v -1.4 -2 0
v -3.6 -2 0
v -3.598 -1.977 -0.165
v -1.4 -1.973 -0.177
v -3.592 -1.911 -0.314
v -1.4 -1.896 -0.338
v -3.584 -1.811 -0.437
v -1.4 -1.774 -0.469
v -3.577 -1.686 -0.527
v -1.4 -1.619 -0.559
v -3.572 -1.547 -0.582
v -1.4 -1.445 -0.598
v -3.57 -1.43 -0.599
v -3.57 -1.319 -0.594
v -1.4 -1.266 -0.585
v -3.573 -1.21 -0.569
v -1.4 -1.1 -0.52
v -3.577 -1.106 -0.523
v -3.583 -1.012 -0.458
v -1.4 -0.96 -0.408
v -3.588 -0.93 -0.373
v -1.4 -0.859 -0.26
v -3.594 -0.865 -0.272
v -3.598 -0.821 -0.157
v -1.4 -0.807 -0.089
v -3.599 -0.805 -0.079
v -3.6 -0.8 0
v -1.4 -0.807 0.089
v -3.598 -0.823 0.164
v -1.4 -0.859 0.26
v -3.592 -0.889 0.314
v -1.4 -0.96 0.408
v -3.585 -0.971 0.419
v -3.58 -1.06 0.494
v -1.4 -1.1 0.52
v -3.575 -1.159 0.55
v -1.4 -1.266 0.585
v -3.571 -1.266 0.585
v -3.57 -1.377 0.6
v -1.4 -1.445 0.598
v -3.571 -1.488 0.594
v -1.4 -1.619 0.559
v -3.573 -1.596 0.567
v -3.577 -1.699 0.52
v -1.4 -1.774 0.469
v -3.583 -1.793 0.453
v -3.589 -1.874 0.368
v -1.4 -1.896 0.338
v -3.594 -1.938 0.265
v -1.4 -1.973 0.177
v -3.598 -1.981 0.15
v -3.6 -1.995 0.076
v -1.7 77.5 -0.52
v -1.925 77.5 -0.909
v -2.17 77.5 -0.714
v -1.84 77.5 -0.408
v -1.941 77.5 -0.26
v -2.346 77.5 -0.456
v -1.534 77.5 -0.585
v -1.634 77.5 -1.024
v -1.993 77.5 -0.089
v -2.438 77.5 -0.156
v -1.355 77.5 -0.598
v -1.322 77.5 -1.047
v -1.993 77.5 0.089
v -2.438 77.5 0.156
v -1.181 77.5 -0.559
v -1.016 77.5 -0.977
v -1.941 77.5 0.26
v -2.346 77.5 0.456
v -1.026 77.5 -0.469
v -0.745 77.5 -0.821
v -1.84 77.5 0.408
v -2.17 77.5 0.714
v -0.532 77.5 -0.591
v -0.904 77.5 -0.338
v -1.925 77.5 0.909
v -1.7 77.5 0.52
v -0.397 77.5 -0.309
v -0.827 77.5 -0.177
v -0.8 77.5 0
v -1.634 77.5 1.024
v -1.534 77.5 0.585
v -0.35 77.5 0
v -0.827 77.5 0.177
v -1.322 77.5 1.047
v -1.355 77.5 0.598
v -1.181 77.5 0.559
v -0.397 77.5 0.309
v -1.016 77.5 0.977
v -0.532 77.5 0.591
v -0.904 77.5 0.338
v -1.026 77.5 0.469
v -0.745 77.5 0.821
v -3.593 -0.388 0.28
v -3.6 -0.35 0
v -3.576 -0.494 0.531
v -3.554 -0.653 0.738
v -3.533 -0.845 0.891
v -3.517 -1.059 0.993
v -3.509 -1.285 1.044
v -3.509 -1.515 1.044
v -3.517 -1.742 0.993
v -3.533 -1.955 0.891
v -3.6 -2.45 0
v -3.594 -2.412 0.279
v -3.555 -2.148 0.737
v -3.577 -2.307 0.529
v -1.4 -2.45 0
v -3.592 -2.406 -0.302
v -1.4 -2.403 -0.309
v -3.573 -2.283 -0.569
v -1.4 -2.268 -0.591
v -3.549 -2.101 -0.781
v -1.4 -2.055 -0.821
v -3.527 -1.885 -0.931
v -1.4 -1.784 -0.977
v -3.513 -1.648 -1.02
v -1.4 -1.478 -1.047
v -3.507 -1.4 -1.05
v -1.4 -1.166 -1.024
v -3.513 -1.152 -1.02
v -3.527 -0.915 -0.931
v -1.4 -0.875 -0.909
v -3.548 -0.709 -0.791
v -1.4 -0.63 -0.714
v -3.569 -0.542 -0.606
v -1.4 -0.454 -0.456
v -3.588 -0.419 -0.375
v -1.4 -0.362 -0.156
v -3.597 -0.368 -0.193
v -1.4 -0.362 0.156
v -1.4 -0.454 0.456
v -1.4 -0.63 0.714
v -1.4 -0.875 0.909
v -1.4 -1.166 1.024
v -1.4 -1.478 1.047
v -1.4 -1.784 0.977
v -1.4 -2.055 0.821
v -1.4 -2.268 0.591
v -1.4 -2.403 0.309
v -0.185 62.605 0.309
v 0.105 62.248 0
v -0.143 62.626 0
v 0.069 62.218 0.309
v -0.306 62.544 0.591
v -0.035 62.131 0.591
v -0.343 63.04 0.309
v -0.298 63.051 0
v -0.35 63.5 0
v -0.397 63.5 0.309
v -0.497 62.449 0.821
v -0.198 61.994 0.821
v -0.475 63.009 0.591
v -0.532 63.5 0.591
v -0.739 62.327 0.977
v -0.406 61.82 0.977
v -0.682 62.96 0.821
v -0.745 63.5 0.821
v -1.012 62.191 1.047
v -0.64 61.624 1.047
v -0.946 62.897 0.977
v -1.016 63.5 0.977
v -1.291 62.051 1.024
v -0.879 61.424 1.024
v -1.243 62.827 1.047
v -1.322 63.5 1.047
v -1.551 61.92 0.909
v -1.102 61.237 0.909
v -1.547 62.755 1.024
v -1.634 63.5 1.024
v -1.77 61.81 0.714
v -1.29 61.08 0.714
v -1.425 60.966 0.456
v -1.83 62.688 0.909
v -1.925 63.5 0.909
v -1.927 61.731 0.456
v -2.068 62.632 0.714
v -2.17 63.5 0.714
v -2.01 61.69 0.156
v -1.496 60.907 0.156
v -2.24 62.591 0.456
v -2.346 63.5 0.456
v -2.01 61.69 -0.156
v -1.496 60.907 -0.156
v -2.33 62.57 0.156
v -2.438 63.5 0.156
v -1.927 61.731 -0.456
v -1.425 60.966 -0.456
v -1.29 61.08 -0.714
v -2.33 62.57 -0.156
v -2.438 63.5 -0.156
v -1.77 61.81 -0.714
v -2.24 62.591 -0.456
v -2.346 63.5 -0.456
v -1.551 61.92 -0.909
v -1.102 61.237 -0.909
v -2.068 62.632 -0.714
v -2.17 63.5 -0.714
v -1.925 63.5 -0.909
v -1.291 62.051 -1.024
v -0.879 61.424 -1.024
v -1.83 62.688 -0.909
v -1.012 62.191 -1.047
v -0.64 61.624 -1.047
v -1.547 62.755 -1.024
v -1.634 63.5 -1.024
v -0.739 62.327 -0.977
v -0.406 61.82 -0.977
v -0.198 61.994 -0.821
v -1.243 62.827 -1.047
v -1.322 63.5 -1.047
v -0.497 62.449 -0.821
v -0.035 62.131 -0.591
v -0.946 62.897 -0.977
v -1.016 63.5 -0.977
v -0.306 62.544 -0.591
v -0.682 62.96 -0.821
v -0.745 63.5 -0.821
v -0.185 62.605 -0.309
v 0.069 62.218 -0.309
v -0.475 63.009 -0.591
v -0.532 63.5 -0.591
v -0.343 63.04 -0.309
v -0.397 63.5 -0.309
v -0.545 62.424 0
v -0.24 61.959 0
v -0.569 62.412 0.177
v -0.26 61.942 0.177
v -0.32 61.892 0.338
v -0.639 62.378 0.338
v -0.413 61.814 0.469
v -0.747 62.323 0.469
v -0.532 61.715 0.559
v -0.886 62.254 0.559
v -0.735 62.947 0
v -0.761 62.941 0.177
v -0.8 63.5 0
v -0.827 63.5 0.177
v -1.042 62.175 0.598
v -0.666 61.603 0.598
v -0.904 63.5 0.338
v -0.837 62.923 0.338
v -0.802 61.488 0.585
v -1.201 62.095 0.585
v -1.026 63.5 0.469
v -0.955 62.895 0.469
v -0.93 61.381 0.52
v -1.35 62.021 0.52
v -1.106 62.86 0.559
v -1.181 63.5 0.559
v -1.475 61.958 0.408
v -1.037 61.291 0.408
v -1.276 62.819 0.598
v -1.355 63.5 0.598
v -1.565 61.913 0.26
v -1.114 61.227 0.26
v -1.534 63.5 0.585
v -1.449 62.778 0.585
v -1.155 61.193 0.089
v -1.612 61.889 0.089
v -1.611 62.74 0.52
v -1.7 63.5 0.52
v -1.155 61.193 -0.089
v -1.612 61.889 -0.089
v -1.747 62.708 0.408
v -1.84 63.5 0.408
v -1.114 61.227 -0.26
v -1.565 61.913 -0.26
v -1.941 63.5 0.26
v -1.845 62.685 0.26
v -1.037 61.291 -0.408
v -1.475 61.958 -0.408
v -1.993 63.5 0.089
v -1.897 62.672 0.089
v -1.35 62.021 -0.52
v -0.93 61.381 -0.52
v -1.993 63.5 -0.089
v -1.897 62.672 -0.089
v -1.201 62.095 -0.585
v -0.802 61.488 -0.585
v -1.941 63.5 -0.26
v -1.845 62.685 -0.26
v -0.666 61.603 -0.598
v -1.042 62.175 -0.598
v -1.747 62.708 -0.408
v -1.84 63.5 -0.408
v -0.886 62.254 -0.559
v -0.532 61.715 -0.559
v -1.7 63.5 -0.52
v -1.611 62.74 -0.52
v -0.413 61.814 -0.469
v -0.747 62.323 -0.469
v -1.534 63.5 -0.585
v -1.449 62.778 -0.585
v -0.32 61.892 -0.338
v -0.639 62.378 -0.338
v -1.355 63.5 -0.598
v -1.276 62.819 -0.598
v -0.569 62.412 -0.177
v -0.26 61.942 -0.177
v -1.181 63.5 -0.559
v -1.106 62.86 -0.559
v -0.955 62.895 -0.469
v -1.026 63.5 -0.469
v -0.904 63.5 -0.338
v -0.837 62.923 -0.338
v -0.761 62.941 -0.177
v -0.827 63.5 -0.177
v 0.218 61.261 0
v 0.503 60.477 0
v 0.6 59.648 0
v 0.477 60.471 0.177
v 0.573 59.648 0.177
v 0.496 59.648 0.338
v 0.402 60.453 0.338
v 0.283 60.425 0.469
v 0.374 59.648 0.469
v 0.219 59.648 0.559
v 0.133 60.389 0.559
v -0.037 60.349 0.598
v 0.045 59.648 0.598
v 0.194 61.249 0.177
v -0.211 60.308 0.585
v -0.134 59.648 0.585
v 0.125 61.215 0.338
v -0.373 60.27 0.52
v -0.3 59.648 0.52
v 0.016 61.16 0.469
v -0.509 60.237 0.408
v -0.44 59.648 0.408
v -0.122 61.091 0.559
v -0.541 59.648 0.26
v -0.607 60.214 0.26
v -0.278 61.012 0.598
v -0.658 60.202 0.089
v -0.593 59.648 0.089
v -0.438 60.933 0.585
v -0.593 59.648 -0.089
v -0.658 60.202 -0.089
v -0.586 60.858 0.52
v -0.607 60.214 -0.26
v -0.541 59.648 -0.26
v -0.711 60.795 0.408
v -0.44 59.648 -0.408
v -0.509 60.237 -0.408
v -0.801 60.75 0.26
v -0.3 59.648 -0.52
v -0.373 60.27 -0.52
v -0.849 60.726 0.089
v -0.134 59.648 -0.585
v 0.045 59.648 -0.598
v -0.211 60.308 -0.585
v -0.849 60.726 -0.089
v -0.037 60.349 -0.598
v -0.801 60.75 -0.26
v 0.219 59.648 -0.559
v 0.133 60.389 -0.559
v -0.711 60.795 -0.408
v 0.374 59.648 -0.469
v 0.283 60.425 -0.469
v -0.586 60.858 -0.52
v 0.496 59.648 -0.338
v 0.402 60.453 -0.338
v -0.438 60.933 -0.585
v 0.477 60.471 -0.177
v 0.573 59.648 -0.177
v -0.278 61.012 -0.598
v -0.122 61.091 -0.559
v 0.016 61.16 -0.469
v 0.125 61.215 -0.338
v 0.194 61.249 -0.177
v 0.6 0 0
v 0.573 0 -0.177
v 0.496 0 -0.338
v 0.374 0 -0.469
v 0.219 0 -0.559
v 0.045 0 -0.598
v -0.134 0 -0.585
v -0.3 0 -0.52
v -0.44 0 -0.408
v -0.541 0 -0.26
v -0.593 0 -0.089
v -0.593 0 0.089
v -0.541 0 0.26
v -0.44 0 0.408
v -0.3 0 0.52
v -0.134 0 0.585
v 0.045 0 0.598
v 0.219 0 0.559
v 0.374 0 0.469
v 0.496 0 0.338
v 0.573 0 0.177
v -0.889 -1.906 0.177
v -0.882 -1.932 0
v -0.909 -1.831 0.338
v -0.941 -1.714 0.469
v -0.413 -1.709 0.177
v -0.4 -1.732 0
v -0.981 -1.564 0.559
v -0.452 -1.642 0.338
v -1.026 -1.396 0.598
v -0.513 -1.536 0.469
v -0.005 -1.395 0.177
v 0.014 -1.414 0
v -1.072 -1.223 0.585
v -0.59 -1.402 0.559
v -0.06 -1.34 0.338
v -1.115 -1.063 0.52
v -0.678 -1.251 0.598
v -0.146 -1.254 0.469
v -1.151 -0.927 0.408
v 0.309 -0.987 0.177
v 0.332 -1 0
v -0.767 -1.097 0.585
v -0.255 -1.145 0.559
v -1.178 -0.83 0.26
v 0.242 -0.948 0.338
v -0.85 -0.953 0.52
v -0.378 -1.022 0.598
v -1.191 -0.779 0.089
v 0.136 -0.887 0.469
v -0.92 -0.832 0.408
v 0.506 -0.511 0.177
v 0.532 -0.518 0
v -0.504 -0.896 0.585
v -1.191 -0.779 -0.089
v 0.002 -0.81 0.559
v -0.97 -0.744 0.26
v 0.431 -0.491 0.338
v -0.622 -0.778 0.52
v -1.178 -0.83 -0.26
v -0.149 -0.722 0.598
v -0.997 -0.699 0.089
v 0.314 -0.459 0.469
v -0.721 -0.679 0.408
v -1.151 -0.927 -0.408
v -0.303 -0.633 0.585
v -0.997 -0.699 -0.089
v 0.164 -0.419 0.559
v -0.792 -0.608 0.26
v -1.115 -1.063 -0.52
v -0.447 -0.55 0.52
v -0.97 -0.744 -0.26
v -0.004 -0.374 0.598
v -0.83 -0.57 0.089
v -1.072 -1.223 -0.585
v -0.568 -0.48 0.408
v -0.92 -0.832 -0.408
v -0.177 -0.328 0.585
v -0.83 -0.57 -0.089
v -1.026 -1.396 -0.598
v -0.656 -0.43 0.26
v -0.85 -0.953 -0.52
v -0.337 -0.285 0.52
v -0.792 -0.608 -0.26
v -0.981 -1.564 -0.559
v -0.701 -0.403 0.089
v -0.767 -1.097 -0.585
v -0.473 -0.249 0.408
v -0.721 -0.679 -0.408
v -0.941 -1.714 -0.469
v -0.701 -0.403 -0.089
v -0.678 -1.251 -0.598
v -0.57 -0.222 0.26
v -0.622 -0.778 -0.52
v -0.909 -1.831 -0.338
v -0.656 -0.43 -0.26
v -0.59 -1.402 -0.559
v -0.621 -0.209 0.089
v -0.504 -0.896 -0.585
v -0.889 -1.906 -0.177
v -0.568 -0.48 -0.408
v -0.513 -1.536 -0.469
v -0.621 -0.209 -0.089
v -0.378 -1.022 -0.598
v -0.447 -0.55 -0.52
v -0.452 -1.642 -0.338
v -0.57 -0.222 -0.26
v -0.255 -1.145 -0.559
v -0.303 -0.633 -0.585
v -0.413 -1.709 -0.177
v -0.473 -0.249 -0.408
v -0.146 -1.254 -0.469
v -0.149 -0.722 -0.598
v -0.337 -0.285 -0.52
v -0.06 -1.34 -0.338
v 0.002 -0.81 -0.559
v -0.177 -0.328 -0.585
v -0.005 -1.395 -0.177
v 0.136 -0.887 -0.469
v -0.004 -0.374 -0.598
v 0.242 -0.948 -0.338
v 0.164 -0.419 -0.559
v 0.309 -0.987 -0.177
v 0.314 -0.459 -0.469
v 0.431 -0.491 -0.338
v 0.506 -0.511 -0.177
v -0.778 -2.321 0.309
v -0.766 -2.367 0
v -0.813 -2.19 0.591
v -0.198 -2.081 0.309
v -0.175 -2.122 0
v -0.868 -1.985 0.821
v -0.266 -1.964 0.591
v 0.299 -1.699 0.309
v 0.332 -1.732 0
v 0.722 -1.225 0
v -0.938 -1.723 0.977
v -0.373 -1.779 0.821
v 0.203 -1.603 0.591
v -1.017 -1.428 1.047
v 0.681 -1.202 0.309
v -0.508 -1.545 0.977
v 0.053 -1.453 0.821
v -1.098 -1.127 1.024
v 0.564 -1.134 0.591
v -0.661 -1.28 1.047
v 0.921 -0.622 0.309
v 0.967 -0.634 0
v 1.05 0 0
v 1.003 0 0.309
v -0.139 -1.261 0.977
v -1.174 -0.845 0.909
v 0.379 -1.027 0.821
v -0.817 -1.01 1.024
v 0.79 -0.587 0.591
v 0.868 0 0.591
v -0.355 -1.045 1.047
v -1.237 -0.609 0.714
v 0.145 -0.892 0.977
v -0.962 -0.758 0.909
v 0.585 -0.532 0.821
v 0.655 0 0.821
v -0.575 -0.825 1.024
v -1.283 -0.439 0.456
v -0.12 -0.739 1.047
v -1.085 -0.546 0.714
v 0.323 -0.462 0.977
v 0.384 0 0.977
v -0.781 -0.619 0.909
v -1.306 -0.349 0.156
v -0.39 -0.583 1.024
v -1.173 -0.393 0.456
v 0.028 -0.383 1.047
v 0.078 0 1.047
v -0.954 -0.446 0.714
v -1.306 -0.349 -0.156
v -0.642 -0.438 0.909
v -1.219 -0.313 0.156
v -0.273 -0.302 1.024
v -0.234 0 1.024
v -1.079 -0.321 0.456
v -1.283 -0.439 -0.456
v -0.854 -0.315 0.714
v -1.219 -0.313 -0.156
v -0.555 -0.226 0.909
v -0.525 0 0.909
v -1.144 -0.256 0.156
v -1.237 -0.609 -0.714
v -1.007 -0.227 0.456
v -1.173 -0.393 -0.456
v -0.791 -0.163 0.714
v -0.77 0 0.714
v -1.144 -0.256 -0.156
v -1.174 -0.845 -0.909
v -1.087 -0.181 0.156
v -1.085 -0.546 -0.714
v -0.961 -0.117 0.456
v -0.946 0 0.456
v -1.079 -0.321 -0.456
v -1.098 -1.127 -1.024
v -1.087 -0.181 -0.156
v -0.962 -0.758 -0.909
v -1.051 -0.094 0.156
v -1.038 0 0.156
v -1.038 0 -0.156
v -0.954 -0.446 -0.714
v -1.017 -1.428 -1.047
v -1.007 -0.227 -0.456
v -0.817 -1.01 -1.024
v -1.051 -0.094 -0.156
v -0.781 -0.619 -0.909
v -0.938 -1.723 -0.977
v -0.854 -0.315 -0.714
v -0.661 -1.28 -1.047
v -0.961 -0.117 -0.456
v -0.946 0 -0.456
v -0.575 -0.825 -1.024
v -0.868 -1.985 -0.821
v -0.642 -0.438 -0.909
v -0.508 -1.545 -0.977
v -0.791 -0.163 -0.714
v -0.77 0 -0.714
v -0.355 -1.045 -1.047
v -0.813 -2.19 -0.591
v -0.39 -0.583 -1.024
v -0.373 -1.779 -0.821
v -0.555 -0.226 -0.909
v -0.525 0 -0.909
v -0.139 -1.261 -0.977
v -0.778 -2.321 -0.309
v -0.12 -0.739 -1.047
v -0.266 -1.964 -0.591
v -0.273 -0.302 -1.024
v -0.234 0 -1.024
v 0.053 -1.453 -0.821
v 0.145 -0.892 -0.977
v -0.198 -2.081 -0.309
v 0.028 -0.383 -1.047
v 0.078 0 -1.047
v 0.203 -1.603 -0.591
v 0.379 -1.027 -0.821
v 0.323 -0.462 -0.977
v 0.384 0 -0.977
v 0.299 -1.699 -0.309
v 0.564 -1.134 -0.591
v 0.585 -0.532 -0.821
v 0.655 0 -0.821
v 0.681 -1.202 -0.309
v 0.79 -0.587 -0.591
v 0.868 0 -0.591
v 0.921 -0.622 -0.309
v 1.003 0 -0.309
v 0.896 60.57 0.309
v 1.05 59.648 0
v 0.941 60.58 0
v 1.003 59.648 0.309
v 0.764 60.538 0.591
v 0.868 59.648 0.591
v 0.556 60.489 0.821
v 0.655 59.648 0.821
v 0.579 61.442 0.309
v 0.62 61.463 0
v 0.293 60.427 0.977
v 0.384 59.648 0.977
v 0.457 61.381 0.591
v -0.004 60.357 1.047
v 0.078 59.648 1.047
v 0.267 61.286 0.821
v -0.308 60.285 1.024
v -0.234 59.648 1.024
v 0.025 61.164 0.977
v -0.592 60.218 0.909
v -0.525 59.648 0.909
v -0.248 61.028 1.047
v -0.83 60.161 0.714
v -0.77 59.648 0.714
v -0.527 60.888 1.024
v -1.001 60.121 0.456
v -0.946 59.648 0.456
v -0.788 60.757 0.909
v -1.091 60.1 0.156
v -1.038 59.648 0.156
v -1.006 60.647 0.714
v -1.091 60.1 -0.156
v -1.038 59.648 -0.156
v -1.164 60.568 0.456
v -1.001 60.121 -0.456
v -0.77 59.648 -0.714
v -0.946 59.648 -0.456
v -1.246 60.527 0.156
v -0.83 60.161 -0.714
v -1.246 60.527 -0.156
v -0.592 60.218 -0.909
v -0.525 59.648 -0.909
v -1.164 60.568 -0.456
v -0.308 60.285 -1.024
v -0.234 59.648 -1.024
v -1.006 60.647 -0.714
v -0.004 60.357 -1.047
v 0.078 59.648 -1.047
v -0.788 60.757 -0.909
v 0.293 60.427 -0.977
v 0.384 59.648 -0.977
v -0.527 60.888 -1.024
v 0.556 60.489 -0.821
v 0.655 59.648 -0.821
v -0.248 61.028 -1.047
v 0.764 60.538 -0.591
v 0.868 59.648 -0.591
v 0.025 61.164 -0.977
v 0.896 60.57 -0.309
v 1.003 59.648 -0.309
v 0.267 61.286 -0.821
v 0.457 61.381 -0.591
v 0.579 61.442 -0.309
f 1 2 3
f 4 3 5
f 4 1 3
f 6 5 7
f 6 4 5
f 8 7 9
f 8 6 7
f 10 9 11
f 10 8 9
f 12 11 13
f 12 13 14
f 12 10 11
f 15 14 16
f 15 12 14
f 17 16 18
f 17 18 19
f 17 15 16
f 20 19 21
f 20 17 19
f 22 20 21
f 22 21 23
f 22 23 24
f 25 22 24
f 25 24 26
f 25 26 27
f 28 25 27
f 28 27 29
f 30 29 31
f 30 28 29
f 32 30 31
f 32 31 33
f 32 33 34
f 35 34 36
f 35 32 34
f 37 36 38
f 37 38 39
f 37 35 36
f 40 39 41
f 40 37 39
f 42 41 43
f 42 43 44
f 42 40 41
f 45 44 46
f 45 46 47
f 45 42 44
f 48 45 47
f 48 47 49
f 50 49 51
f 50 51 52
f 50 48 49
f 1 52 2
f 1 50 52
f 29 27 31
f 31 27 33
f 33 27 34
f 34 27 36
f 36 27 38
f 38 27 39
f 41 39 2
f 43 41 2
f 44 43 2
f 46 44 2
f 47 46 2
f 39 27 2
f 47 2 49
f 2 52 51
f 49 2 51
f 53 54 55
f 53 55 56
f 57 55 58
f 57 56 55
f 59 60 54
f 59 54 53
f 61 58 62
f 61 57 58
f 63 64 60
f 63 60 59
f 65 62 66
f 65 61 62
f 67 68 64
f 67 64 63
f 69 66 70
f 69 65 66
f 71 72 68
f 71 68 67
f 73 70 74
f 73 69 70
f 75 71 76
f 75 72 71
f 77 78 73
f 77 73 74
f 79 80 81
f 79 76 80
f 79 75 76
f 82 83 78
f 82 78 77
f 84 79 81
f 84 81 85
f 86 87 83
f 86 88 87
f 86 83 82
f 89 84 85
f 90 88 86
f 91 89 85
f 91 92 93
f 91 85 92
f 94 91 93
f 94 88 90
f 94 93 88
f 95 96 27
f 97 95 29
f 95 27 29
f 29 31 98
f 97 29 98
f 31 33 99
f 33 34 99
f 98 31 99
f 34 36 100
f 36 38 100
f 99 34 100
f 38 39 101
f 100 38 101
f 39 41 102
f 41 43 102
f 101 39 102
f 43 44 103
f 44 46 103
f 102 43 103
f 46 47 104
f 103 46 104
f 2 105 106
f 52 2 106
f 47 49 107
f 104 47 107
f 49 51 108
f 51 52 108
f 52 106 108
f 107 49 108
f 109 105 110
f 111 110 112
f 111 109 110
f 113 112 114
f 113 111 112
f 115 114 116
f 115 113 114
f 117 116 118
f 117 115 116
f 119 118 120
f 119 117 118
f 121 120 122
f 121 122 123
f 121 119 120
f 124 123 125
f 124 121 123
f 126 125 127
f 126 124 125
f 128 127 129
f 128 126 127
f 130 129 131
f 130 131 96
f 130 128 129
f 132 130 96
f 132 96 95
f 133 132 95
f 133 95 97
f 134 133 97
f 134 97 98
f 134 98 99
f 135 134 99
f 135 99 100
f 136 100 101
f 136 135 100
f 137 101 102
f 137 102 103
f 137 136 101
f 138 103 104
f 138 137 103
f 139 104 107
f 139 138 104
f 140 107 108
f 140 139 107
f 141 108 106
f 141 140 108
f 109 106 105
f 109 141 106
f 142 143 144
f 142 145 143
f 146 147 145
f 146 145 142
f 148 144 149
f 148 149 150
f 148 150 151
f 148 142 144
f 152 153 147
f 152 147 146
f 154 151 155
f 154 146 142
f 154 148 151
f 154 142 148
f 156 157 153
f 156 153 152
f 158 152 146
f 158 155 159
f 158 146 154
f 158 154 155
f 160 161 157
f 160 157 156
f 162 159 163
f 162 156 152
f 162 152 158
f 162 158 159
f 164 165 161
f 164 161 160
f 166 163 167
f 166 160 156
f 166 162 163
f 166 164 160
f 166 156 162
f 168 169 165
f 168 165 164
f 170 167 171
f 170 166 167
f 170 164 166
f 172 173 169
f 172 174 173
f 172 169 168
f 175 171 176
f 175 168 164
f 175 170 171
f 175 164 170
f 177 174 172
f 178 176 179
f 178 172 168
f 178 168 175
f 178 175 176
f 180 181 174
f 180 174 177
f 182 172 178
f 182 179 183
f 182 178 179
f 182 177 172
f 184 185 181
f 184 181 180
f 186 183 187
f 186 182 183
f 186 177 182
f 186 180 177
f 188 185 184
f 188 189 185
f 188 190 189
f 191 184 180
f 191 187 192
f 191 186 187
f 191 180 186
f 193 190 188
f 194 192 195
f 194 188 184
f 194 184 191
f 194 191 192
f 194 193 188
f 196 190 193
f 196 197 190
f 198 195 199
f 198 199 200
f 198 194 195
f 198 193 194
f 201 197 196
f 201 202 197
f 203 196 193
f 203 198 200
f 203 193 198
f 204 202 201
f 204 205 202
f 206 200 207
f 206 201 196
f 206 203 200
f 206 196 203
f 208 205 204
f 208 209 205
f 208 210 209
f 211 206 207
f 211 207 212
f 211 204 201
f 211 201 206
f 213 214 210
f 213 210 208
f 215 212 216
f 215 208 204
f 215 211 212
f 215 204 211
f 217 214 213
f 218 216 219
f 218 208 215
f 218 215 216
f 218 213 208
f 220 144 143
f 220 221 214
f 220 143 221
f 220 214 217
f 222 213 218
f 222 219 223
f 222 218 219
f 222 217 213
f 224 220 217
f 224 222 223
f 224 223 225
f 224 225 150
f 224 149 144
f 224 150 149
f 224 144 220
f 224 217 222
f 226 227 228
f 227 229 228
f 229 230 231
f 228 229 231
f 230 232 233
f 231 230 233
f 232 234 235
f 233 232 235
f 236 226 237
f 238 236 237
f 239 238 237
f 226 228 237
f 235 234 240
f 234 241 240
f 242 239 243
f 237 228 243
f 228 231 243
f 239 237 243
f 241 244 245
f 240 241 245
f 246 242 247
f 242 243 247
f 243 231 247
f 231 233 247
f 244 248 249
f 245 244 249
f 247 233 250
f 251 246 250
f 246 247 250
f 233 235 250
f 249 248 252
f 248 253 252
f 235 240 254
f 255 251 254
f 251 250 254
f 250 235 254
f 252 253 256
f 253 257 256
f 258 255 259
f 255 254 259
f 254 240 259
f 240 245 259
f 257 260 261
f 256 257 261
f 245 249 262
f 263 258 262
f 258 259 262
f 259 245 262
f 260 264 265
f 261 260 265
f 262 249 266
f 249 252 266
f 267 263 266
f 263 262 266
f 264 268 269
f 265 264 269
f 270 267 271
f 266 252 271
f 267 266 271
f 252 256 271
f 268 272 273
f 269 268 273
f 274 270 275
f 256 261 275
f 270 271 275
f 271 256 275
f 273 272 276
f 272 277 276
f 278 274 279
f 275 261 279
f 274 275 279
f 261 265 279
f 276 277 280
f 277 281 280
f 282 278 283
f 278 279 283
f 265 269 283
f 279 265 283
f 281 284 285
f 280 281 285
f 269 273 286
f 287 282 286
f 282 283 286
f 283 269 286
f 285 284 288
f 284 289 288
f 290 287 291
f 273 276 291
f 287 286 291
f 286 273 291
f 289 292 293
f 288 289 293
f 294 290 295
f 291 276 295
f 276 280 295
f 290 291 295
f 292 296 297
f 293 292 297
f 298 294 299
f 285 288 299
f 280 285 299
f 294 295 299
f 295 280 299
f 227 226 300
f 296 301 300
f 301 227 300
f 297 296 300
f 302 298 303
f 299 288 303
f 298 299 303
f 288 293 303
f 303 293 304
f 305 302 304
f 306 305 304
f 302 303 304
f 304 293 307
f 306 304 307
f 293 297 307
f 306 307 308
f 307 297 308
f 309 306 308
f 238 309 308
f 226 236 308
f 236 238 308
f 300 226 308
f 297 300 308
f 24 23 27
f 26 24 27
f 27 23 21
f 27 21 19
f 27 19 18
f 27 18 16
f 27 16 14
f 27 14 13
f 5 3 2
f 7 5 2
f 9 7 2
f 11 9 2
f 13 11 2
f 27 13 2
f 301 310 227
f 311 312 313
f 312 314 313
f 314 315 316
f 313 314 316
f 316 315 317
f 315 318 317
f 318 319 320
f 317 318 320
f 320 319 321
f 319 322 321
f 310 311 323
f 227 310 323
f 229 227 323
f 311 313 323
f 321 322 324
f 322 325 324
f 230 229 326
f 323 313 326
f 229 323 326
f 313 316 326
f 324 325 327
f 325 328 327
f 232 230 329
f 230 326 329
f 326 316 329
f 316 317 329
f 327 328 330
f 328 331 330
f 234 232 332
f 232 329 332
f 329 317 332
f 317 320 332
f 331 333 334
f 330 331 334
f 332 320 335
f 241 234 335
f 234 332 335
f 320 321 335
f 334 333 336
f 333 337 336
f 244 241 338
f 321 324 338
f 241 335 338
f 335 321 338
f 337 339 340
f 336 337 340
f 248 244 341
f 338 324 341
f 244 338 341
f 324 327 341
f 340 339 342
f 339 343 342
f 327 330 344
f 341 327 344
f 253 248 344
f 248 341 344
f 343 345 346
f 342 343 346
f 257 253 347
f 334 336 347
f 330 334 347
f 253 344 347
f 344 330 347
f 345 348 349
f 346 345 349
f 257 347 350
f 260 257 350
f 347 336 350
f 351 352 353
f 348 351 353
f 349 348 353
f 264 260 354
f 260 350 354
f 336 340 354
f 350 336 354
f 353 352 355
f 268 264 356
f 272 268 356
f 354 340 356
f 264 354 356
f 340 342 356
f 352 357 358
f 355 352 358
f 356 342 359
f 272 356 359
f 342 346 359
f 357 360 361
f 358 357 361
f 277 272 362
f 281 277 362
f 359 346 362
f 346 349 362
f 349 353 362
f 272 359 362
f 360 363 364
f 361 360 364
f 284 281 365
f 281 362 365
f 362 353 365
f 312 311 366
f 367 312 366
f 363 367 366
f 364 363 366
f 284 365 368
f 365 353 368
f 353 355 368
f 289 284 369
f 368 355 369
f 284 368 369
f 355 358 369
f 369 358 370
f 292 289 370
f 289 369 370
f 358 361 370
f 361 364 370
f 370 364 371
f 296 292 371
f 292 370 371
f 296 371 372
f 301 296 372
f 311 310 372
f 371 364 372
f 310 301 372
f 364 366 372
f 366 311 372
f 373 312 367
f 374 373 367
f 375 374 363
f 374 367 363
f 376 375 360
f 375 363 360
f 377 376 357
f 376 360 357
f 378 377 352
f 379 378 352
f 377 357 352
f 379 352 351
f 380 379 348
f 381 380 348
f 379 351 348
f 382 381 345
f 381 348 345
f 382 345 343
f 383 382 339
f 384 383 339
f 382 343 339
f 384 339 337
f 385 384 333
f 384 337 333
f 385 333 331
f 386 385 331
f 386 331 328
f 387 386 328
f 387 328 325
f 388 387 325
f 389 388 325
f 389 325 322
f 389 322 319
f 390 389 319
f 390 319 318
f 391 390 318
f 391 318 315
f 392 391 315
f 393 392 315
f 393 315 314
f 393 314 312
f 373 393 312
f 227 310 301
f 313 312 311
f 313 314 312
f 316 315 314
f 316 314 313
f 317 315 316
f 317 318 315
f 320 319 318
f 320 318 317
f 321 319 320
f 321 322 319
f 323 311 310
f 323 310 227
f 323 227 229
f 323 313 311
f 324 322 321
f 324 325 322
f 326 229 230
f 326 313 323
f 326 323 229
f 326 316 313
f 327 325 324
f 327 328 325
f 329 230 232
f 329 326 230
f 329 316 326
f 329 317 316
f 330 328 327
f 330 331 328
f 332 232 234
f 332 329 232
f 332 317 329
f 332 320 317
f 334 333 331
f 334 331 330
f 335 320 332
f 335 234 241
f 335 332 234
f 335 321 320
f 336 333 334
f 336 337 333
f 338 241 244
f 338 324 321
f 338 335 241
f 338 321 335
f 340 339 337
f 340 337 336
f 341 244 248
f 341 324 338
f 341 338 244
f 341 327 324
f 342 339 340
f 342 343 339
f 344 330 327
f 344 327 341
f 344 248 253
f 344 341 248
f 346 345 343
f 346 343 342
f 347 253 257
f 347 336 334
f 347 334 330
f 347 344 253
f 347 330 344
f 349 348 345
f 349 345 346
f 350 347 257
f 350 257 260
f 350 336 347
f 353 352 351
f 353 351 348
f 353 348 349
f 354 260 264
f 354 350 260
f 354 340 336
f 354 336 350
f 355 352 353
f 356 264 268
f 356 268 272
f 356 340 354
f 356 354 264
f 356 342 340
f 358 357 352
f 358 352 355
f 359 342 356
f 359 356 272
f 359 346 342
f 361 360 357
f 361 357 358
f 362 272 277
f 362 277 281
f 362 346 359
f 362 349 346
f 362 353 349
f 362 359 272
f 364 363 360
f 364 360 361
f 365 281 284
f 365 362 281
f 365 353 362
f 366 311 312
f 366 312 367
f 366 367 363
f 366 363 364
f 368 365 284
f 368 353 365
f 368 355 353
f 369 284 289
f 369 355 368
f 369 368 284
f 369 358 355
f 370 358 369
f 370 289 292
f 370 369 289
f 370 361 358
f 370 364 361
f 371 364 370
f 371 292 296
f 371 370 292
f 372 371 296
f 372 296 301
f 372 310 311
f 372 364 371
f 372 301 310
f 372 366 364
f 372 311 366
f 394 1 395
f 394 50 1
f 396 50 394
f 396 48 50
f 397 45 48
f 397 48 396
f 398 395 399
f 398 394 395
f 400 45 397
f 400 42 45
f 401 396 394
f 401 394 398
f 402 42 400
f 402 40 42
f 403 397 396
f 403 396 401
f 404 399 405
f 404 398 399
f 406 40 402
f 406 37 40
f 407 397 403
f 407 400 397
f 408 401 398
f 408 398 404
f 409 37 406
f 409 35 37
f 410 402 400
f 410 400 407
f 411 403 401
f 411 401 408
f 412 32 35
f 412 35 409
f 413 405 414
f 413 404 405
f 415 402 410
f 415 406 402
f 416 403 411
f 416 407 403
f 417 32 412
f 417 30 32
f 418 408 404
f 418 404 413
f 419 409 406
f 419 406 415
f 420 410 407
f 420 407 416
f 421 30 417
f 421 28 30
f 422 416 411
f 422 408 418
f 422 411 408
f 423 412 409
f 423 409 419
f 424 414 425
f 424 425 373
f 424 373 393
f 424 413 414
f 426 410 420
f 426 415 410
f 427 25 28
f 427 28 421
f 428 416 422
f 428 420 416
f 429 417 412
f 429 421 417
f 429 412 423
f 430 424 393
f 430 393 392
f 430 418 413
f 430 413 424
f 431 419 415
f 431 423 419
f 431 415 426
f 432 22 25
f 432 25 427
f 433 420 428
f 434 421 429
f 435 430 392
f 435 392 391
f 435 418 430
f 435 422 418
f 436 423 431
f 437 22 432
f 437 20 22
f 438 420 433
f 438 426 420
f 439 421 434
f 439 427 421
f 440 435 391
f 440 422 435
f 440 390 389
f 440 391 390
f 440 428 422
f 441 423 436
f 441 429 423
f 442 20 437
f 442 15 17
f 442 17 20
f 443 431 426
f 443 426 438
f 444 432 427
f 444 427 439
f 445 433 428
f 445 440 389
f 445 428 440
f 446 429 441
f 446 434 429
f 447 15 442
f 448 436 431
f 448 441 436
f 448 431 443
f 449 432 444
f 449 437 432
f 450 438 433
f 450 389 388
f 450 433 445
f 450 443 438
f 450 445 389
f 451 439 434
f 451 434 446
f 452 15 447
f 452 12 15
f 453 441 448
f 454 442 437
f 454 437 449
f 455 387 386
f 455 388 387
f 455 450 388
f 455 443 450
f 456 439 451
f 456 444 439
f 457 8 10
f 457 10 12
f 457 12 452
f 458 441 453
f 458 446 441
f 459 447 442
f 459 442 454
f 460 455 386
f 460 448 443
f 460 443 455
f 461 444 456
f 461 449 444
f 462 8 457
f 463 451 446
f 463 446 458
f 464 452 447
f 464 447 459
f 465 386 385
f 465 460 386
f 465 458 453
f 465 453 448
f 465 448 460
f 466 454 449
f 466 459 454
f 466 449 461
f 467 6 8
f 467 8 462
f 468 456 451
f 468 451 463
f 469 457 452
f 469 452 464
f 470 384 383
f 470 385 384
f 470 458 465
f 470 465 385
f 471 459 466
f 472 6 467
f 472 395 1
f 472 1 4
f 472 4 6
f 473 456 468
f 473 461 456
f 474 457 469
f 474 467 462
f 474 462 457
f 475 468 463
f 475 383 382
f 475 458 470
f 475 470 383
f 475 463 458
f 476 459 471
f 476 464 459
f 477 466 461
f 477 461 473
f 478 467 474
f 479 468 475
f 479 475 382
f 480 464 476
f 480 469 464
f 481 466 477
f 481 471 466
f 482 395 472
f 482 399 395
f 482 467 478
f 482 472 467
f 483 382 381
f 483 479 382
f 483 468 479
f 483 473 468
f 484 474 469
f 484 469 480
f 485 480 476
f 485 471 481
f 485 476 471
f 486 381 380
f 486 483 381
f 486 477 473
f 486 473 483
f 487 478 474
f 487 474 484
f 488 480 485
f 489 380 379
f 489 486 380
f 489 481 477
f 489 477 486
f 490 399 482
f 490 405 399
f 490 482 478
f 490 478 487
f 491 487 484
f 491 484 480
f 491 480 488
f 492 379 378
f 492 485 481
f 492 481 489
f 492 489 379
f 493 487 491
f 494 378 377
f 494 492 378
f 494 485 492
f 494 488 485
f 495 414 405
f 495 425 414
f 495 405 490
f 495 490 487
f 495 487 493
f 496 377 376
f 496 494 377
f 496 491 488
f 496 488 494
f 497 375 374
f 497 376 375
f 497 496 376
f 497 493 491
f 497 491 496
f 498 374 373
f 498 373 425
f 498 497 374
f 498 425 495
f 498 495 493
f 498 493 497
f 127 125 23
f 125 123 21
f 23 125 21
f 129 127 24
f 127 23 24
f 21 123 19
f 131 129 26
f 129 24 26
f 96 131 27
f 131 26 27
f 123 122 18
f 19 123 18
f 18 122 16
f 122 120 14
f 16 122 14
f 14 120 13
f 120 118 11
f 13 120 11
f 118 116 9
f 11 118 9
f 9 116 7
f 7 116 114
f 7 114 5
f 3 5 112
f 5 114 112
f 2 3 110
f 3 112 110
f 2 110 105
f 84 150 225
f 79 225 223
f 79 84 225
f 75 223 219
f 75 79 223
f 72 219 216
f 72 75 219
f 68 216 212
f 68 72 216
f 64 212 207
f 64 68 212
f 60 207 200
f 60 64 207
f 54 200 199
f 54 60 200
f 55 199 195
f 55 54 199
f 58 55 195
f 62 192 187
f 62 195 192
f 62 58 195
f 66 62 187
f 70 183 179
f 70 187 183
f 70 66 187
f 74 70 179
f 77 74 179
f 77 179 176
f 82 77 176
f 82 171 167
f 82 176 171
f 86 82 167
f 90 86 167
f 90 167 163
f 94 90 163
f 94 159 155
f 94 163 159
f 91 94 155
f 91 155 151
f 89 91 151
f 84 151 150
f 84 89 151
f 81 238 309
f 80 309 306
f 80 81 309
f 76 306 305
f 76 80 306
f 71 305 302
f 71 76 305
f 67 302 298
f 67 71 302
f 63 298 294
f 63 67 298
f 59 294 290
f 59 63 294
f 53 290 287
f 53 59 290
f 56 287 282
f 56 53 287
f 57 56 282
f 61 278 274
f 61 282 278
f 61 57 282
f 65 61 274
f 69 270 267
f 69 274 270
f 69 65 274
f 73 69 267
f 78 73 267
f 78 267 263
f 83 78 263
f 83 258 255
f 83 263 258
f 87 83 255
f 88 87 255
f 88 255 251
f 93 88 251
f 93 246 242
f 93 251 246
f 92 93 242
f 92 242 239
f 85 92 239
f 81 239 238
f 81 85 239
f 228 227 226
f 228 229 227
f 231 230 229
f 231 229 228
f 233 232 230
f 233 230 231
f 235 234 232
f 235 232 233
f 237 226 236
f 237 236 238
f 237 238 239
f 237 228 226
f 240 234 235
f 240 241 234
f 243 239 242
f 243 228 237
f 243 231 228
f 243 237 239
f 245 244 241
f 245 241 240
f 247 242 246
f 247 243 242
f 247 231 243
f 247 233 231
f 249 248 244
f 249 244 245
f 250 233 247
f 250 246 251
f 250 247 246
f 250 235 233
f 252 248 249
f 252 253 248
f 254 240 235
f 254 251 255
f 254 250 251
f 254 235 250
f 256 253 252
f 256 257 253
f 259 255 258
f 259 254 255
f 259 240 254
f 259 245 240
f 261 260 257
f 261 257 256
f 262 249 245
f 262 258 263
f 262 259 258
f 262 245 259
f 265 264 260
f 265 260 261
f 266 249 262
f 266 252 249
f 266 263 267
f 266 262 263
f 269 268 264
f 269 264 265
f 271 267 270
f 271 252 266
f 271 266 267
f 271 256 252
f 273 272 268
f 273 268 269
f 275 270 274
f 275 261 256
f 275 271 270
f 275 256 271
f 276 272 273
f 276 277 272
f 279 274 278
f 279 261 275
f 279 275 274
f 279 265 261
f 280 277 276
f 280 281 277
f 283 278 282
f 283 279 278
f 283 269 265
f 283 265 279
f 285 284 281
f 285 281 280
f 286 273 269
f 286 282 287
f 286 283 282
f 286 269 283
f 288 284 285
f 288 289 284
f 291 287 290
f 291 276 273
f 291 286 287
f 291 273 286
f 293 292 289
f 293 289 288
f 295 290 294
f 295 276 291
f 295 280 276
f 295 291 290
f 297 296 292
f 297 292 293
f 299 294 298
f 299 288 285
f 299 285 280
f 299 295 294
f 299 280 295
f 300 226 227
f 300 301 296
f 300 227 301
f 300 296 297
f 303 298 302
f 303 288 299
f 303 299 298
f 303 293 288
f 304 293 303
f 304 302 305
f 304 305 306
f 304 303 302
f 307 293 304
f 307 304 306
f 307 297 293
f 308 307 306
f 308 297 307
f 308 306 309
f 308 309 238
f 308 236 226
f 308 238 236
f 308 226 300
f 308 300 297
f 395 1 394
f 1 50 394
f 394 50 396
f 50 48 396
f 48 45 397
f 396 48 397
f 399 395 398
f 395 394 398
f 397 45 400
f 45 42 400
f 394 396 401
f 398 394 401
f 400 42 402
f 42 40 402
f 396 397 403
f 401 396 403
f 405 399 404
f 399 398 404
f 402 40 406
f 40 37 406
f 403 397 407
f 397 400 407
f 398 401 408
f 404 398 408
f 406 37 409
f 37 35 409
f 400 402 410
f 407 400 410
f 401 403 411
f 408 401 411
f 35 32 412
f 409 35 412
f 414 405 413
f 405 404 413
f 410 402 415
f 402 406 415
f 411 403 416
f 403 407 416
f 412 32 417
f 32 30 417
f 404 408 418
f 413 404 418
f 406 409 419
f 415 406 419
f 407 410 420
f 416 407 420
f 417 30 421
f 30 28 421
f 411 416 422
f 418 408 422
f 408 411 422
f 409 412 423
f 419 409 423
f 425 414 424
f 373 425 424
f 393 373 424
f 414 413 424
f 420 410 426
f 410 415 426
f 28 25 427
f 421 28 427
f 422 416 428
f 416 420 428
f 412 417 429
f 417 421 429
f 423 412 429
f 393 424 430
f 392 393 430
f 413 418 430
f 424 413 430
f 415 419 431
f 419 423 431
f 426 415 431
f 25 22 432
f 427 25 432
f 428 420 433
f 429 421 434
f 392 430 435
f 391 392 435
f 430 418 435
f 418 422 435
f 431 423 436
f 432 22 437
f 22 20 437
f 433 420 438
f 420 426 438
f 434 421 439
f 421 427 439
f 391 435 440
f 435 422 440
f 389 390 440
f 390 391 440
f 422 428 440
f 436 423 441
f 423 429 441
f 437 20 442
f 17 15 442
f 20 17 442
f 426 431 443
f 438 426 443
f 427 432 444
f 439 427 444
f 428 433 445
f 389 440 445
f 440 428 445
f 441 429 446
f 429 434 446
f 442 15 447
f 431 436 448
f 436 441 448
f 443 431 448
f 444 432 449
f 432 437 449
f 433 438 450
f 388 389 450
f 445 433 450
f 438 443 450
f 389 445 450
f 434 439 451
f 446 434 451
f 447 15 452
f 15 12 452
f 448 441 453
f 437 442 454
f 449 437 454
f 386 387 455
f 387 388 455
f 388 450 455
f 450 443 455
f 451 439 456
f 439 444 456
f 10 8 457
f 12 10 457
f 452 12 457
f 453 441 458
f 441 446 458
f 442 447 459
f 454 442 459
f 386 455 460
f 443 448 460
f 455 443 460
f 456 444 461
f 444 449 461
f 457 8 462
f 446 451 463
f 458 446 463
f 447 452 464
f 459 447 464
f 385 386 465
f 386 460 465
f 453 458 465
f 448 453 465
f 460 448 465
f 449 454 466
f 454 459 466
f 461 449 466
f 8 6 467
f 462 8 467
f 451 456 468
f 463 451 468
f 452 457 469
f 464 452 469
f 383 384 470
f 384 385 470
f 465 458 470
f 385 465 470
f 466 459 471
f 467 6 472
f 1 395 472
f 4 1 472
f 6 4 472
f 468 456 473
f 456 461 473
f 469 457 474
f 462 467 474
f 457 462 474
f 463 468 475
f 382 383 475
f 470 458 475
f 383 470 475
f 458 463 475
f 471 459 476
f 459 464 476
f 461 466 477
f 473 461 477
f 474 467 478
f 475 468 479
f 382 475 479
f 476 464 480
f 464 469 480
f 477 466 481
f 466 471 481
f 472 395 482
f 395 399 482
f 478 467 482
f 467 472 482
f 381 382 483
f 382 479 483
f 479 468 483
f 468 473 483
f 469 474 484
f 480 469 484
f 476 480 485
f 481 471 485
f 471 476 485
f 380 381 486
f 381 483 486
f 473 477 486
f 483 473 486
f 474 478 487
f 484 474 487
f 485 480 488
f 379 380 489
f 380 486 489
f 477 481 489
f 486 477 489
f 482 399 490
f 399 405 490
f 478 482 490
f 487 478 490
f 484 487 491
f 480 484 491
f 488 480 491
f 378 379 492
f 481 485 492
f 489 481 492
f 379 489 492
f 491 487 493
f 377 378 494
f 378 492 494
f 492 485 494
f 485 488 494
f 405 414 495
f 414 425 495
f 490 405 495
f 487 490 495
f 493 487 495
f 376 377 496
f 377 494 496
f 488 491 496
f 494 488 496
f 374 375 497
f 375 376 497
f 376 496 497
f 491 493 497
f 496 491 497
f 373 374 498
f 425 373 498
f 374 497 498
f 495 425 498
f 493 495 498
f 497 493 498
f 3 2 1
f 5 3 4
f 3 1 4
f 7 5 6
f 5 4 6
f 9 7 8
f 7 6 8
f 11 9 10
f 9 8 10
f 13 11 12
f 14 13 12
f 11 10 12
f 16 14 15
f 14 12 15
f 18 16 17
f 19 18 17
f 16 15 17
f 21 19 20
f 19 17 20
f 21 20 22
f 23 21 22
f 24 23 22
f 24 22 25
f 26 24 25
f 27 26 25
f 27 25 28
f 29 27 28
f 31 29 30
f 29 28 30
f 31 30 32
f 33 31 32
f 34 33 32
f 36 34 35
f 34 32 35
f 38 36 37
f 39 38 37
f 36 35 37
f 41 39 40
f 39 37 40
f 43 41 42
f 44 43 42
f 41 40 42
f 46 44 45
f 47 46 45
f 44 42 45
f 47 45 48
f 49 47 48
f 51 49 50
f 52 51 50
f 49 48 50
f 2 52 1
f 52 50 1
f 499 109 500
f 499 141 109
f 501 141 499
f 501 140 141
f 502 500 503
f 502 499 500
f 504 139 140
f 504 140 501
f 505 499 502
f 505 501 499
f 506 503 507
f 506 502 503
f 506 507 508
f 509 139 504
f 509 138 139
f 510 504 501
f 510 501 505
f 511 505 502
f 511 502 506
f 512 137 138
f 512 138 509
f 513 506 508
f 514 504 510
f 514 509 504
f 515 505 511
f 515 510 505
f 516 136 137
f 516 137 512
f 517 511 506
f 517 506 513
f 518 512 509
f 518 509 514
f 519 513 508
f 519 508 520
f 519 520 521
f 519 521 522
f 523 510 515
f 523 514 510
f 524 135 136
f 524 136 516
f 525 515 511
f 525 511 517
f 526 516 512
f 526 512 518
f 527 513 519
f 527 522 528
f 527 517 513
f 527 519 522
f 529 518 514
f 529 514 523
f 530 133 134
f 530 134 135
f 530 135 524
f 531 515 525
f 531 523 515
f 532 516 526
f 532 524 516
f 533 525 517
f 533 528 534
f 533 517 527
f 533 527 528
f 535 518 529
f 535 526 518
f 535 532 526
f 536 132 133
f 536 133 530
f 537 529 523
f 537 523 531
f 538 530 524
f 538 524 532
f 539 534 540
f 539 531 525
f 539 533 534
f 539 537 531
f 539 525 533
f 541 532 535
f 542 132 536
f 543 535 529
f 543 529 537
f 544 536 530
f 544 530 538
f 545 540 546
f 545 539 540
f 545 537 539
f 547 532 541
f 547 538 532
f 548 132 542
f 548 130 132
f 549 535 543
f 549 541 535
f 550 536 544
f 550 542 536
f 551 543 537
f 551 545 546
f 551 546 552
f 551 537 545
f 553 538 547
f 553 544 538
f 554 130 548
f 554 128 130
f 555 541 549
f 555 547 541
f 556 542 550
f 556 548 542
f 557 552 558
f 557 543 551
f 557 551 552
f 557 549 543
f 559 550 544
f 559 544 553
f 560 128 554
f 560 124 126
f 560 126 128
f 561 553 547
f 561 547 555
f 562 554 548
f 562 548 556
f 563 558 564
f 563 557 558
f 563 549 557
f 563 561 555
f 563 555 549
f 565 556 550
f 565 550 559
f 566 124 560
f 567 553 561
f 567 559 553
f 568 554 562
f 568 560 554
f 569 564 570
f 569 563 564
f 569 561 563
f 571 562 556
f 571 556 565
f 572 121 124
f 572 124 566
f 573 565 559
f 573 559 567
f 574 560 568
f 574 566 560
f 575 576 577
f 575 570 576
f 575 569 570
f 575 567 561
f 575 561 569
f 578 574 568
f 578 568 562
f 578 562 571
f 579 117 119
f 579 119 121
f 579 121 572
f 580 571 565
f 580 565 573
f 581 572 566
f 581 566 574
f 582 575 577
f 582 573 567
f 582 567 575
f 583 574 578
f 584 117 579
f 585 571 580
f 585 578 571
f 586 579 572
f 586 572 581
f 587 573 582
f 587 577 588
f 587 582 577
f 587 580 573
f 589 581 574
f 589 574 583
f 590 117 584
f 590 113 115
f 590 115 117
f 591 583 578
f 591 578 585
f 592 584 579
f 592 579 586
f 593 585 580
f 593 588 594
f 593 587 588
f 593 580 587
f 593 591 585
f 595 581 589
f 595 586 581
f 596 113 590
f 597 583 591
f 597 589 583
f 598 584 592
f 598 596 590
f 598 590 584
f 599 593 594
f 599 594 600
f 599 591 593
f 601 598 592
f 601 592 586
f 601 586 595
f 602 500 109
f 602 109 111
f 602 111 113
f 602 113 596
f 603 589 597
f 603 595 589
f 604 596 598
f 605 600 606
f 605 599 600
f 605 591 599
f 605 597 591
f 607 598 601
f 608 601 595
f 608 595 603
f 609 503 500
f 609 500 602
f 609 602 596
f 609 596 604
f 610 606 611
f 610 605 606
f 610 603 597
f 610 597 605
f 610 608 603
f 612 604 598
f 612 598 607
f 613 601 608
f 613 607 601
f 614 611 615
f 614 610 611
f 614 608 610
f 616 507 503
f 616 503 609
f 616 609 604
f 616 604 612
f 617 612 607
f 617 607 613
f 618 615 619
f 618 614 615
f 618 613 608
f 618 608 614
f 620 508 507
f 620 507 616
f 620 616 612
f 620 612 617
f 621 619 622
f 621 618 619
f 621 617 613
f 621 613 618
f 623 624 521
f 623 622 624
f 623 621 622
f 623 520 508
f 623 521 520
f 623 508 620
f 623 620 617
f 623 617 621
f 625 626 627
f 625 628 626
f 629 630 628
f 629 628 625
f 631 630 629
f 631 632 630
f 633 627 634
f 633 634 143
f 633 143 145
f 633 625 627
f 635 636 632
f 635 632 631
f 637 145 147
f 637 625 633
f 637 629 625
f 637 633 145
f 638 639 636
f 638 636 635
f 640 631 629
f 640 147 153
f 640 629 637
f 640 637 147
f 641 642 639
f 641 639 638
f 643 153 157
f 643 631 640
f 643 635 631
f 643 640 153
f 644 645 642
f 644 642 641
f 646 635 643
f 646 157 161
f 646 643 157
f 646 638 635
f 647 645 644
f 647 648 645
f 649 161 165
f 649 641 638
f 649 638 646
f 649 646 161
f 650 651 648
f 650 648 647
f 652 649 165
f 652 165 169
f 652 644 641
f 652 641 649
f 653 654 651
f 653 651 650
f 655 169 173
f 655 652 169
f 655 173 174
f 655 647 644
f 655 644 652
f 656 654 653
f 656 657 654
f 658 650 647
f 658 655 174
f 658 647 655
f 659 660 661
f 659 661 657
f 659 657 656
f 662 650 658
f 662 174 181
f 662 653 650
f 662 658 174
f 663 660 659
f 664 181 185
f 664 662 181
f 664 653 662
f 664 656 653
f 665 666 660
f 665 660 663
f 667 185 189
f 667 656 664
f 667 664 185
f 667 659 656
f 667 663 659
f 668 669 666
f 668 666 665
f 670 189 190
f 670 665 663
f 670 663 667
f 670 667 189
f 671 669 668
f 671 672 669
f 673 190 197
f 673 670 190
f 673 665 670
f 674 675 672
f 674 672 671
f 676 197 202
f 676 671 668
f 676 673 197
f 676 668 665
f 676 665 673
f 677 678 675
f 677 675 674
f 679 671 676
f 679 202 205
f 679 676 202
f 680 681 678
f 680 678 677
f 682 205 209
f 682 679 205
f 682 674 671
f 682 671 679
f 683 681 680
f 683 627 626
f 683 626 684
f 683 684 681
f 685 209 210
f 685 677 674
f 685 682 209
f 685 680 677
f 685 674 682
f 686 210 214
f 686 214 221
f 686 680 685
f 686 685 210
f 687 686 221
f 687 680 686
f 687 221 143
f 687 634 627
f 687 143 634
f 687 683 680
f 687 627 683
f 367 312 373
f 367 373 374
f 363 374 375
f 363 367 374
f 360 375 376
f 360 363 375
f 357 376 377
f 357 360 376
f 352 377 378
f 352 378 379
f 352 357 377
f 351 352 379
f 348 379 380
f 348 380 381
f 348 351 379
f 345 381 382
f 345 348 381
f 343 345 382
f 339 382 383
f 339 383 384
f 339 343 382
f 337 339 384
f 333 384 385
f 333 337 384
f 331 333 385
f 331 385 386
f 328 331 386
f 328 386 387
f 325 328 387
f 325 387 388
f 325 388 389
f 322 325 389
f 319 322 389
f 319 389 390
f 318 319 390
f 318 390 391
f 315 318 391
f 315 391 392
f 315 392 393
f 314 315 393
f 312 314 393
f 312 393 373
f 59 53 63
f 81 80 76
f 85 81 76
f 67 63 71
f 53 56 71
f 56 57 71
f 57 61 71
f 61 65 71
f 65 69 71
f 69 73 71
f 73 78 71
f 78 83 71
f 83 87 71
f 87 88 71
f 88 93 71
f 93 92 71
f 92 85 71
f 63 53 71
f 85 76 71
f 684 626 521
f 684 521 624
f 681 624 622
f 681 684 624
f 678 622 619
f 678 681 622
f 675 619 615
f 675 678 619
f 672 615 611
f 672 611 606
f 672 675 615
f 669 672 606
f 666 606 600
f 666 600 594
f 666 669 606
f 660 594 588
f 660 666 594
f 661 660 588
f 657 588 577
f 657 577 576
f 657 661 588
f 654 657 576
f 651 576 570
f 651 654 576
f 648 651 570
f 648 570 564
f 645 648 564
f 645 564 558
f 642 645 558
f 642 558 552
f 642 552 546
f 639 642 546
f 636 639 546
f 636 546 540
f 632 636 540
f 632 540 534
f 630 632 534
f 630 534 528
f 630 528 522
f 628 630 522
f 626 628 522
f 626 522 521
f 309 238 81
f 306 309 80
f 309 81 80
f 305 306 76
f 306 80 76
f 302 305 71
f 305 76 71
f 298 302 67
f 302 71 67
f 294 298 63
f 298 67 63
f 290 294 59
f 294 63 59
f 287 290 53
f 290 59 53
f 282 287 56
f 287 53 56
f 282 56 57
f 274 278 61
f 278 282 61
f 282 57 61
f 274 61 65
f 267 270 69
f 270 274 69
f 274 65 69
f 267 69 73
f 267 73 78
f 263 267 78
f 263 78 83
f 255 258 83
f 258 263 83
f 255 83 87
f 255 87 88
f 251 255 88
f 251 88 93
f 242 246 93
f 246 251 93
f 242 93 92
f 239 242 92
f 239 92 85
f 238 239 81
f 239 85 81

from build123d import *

# Parameters (mm, degrees)
SKETCH_1_R          = 1.05
SKETCH_3_R          = 0.6
SKETCH_4_R          = 0.6
SKETCH_5_R          = 0.6
SKETCH_7_R          = 1.05
SKETCH_7_R_2        = 0.6
CUT_EXTRUDE_2_DEPTH = 3
CUT_EXTRUDE_3_DEPTH = 3


with BuildPart() as part:
    # Sweep 1: sweep along a path in Эскиз2
    with BuildLine(Plane.XY) as sweep_1_path:
        Line((0, 0), (0, 59.64772794))
        ThreePointArc((0, 59.64772794), (-0.180425564, 60.672423017), (-0.7, 61.573863968))
        ThreePointArc((-0.7, 61.573863968), (-1.219574436, 62.47530492), (-1.4, 63.499999997))
        Line((-1.4, 63.499999997), (-1.4, 77.499999997))
    # Эскиз1 → Sweep 1 (sweep)
    with BuildSketch(Plane(origin=(0, 0, 0), x_dir=(1, 0, 0), z_dir=(0, 1, 0))):
        Circle(SKETCH_1_R)
    sweep(path=sweep_1_path.line)

    # Sweep 1 2: sweep along a path in Эскиз2<2>
    with BuildLine(Plane.XY) as sweep_1_2_path:
        Line((0, 0), (0, 59.64772794))
        ThreePointArc((0, 59.64772794), (-0.180425564, 60.672423017), (-0.7, 61.573863968))
        ThreePointArc((-0.7, 61.573863968), (-1.219574436, 62.47530492), (-1.4, 63.499999997))
        Line((-1.4, 63.499999997), (-1.4, 77.499999997))
    # Эскиз3 → Sweep 1 2 (sweep, cut)
    with BuildSketch(Plane.XZ):
        Circle(SKETCH_3_R)
    sweep(path=sweep_1_2_path.line, mode=Mode.SUBTRACT)

    # По траектории4: sweep along a path in Эскиз6<2>
    with BuildLine(Plane.XY) as sweep_4_path:
        Line((-3.6, -1.4), (-1.4, -1.4))
        ThreePointArc((-1.4, -1.4), (-0.410050506, -0.989949494), (0, 0))
    # Эскиз7 → По траектории4 (sweep)
    with BuildSketch(Plane.XZ):
        Circle(SKETCH_7_R)
        Circle(SKETCH_7_R_2, mode=Mode.SUBTRACT)
    sweep(path=sweep_4_path.line)


with BuildPart() as body_2:
    # По траектории2: sweep along a path in Эскиз2<3>
    with BuildLine(Plane.XY) as sweep_2_path:
        Line((0, 0), (0, 59.64772794))
        ThreePointArc((0, 59.64772794), (-0.180425564, 60.672423017), (-0.7, 61.573863968))
        ThreePointArc((-0.7, 61.573863968), (-1.219574436, 62.47530492), (-1.4, 63.499999997))
        Line((-1.4, 63.499999997), (-1.4, 77.499999997))
    # Эскиз4 → По траектории2 (sweep)
    with BuildSketch(Plane.XZ):
        Circle(SKETCH_4_R)
    sweep(path=sweep_2_path.line)

    # По траектории3: sweep along a path in Эскиз6
    with BuildLine(Plane.XY) as sweep_3_path:
        Line((-3.6, -1.4), (-1.4, -1.4))
        ThreePointArc((-1.4, -1.4), (-0.410050506, -0.989949494), (0, 0))
    # Эскиз5 → По траектории3 (sweep)
    with BuildSketch(Plane.XZ):
        Circle(SKETCH_5_R)
    sweep(path=sweep_3_path.line)


with BuildPart() as cut_extrude_2_tool:
    # Эскиз8 → Вырез-Вытянуть2 (new body)
    with BuildSketch(Plane(origin=(0, -2.45, 0), x_dir=(-1, 0, 0), z_dir=(0, -1, 0))):
        with BuildLine():
            ThreePointArc((3.5074106, 1.05), (3.576807827, 0.52703719), (3.6, 0))
            Line((3.6, 0), (3.6, 1.05))
            Line((3.6, 1.05), (3.5074106, 1.05))
        make_face()
    extrude(amount=-CUT_EXTRUDE_2_DEPTH)


with BuildPart() as part_1:
    add(part.part)

    # Вырез-Вытянуть2: cut by cut_extrude_2_tool
    add(cut_extrude_2_tool.part, mode=Mode.SUBTRACT)


with BuildPart() as body_2_1:
    add(body_2.part)

    # Вырез-Вытянуть2: cut by cut_extrude_2_tool
    add(cut_extrude_2_tool.part, mode=Mode.SUBTRACT)


with BuildPart() as cut_extrude_3_tool:
    # Эскиз8<3> → Вырез-Вытянуть3 (new body)
    with BuildSketch(Plane(origin=(0, -2.45, 0), x_dir=(-1, 0, 0), z_dir=(0, -1, 0))):
        with BuildLine():
            Line((3.5074106, -1.05), (3.6, -1.05))
            Line((3.6, -1.05), (3.6, 0))
            ThreePointArc((3.6, 0), (3.576807827, -0.52703719), (3.5074106, -1.05))
        make_face()
    extrude(amount=-CUT_EXTRUDE_3_DEPTH)


with BuildPart() as part_2:
    add(part_1.part)

    # Вырез-Вытянуть3: cut by cut_extrude_3_tool
    add(cut_extrude_3_tool.part, mode=Mode.SUBTRACT)


with BuildPart() as body_2_2:
    add(body_2_1.part)

    # Вырез-Вытянуть3: cut by cut_extrude_3_tool
    add(cut_extrude_3_tool.part, mode=Mode.SUBTRACT)


solid = Compound([part_2.part, body_2_2.part])
